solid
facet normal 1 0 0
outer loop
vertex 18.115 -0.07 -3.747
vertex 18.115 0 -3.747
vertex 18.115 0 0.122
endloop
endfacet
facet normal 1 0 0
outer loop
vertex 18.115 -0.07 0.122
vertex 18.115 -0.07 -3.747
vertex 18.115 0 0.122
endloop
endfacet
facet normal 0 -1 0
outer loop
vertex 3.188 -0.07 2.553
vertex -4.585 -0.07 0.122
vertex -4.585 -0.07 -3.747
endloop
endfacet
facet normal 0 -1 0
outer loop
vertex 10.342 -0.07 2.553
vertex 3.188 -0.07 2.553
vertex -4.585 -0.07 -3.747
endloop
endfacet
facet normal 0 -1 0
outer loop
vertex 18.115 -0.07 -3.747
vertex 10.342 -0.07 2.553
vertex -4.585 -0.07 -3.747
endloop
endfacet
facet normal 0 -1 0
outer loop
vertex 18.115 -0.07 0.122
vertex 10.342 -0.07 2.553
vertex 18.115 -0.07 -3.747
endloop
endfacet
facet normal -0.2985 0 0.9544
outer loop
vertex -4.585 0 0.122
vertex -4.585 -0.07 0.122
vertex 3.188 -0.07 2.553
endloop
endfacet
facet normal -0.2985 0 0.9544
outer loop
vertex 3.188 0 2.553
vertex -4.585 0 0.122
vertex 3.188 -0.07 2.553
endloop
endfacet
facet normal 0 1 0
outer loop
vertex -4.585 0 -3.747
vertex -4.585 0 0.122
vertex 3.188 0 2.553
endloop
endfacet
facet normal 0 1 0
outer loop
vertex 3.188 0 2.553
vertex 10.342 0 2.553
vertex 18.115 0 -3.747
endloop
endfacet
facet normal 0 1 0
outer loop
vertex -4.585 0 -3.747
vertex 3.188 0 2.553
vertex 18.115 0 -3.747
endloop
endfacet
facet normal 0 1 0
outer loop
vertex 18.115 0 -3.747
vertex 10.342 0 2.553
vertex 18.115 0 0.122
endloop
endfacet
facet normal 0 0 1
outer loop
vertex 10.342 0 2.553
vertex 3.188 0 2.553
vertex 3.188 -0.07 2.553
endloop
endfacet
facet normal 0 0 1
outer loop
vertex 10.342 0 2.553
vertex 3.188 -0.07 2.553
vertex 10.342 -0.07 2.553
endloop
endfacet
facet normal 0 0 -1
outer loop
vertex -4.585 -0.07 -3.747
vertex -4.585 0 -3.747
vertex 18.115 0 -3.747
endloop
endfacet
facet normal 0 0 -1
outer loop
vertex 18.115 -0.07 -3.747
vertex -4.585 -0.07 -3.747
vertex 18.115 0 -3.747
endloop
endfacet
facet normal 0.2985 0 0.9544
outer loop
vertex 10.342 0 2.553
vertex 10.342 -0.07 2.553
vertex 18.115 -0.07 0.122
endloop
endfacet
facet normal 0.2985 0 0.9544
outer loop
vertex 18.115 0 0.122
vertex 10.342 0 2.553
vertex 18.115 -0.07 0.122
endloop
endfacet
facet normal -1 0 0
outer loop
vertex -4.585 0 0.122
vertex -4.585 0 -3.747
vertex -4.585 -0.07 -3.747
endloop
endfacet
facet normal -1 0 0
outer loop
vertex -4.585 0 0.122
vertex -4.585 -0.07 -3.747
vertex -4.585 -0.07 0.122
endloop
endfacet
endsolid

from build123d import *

# Parameters (mm, degrees)
F0_W     = 22.7
F0_H     = 6.3
F1_DEPTH = 0.07
F3_DEPTH = 25


with BuildPart() as f1:
    # F0 (on Front) → F1 (new body)
    with BuildSketch(Plane.XZ):
        with Locations((6.764986, -0.59659)):
            Rectangle(F0_W, F0_H)
    extrude(amount=F1_DEPTH)

    # F2 (on face) → F3 (cut)
    with BuildSketch(Plane.XZ.offset(0.07)):
        Polygon((-4.585014, 2.55341), (-4.585014, 0.12241), (3.187986, 2.55341), align=None)
        Polygon((18.114986, 2.55341), (10.341986, 2.55341), (18.114986, 0.12241), align=None)
    extrude(amount=-F3_DEPTH, mode=Mode.SUBTRACT)


solid = f1.part
